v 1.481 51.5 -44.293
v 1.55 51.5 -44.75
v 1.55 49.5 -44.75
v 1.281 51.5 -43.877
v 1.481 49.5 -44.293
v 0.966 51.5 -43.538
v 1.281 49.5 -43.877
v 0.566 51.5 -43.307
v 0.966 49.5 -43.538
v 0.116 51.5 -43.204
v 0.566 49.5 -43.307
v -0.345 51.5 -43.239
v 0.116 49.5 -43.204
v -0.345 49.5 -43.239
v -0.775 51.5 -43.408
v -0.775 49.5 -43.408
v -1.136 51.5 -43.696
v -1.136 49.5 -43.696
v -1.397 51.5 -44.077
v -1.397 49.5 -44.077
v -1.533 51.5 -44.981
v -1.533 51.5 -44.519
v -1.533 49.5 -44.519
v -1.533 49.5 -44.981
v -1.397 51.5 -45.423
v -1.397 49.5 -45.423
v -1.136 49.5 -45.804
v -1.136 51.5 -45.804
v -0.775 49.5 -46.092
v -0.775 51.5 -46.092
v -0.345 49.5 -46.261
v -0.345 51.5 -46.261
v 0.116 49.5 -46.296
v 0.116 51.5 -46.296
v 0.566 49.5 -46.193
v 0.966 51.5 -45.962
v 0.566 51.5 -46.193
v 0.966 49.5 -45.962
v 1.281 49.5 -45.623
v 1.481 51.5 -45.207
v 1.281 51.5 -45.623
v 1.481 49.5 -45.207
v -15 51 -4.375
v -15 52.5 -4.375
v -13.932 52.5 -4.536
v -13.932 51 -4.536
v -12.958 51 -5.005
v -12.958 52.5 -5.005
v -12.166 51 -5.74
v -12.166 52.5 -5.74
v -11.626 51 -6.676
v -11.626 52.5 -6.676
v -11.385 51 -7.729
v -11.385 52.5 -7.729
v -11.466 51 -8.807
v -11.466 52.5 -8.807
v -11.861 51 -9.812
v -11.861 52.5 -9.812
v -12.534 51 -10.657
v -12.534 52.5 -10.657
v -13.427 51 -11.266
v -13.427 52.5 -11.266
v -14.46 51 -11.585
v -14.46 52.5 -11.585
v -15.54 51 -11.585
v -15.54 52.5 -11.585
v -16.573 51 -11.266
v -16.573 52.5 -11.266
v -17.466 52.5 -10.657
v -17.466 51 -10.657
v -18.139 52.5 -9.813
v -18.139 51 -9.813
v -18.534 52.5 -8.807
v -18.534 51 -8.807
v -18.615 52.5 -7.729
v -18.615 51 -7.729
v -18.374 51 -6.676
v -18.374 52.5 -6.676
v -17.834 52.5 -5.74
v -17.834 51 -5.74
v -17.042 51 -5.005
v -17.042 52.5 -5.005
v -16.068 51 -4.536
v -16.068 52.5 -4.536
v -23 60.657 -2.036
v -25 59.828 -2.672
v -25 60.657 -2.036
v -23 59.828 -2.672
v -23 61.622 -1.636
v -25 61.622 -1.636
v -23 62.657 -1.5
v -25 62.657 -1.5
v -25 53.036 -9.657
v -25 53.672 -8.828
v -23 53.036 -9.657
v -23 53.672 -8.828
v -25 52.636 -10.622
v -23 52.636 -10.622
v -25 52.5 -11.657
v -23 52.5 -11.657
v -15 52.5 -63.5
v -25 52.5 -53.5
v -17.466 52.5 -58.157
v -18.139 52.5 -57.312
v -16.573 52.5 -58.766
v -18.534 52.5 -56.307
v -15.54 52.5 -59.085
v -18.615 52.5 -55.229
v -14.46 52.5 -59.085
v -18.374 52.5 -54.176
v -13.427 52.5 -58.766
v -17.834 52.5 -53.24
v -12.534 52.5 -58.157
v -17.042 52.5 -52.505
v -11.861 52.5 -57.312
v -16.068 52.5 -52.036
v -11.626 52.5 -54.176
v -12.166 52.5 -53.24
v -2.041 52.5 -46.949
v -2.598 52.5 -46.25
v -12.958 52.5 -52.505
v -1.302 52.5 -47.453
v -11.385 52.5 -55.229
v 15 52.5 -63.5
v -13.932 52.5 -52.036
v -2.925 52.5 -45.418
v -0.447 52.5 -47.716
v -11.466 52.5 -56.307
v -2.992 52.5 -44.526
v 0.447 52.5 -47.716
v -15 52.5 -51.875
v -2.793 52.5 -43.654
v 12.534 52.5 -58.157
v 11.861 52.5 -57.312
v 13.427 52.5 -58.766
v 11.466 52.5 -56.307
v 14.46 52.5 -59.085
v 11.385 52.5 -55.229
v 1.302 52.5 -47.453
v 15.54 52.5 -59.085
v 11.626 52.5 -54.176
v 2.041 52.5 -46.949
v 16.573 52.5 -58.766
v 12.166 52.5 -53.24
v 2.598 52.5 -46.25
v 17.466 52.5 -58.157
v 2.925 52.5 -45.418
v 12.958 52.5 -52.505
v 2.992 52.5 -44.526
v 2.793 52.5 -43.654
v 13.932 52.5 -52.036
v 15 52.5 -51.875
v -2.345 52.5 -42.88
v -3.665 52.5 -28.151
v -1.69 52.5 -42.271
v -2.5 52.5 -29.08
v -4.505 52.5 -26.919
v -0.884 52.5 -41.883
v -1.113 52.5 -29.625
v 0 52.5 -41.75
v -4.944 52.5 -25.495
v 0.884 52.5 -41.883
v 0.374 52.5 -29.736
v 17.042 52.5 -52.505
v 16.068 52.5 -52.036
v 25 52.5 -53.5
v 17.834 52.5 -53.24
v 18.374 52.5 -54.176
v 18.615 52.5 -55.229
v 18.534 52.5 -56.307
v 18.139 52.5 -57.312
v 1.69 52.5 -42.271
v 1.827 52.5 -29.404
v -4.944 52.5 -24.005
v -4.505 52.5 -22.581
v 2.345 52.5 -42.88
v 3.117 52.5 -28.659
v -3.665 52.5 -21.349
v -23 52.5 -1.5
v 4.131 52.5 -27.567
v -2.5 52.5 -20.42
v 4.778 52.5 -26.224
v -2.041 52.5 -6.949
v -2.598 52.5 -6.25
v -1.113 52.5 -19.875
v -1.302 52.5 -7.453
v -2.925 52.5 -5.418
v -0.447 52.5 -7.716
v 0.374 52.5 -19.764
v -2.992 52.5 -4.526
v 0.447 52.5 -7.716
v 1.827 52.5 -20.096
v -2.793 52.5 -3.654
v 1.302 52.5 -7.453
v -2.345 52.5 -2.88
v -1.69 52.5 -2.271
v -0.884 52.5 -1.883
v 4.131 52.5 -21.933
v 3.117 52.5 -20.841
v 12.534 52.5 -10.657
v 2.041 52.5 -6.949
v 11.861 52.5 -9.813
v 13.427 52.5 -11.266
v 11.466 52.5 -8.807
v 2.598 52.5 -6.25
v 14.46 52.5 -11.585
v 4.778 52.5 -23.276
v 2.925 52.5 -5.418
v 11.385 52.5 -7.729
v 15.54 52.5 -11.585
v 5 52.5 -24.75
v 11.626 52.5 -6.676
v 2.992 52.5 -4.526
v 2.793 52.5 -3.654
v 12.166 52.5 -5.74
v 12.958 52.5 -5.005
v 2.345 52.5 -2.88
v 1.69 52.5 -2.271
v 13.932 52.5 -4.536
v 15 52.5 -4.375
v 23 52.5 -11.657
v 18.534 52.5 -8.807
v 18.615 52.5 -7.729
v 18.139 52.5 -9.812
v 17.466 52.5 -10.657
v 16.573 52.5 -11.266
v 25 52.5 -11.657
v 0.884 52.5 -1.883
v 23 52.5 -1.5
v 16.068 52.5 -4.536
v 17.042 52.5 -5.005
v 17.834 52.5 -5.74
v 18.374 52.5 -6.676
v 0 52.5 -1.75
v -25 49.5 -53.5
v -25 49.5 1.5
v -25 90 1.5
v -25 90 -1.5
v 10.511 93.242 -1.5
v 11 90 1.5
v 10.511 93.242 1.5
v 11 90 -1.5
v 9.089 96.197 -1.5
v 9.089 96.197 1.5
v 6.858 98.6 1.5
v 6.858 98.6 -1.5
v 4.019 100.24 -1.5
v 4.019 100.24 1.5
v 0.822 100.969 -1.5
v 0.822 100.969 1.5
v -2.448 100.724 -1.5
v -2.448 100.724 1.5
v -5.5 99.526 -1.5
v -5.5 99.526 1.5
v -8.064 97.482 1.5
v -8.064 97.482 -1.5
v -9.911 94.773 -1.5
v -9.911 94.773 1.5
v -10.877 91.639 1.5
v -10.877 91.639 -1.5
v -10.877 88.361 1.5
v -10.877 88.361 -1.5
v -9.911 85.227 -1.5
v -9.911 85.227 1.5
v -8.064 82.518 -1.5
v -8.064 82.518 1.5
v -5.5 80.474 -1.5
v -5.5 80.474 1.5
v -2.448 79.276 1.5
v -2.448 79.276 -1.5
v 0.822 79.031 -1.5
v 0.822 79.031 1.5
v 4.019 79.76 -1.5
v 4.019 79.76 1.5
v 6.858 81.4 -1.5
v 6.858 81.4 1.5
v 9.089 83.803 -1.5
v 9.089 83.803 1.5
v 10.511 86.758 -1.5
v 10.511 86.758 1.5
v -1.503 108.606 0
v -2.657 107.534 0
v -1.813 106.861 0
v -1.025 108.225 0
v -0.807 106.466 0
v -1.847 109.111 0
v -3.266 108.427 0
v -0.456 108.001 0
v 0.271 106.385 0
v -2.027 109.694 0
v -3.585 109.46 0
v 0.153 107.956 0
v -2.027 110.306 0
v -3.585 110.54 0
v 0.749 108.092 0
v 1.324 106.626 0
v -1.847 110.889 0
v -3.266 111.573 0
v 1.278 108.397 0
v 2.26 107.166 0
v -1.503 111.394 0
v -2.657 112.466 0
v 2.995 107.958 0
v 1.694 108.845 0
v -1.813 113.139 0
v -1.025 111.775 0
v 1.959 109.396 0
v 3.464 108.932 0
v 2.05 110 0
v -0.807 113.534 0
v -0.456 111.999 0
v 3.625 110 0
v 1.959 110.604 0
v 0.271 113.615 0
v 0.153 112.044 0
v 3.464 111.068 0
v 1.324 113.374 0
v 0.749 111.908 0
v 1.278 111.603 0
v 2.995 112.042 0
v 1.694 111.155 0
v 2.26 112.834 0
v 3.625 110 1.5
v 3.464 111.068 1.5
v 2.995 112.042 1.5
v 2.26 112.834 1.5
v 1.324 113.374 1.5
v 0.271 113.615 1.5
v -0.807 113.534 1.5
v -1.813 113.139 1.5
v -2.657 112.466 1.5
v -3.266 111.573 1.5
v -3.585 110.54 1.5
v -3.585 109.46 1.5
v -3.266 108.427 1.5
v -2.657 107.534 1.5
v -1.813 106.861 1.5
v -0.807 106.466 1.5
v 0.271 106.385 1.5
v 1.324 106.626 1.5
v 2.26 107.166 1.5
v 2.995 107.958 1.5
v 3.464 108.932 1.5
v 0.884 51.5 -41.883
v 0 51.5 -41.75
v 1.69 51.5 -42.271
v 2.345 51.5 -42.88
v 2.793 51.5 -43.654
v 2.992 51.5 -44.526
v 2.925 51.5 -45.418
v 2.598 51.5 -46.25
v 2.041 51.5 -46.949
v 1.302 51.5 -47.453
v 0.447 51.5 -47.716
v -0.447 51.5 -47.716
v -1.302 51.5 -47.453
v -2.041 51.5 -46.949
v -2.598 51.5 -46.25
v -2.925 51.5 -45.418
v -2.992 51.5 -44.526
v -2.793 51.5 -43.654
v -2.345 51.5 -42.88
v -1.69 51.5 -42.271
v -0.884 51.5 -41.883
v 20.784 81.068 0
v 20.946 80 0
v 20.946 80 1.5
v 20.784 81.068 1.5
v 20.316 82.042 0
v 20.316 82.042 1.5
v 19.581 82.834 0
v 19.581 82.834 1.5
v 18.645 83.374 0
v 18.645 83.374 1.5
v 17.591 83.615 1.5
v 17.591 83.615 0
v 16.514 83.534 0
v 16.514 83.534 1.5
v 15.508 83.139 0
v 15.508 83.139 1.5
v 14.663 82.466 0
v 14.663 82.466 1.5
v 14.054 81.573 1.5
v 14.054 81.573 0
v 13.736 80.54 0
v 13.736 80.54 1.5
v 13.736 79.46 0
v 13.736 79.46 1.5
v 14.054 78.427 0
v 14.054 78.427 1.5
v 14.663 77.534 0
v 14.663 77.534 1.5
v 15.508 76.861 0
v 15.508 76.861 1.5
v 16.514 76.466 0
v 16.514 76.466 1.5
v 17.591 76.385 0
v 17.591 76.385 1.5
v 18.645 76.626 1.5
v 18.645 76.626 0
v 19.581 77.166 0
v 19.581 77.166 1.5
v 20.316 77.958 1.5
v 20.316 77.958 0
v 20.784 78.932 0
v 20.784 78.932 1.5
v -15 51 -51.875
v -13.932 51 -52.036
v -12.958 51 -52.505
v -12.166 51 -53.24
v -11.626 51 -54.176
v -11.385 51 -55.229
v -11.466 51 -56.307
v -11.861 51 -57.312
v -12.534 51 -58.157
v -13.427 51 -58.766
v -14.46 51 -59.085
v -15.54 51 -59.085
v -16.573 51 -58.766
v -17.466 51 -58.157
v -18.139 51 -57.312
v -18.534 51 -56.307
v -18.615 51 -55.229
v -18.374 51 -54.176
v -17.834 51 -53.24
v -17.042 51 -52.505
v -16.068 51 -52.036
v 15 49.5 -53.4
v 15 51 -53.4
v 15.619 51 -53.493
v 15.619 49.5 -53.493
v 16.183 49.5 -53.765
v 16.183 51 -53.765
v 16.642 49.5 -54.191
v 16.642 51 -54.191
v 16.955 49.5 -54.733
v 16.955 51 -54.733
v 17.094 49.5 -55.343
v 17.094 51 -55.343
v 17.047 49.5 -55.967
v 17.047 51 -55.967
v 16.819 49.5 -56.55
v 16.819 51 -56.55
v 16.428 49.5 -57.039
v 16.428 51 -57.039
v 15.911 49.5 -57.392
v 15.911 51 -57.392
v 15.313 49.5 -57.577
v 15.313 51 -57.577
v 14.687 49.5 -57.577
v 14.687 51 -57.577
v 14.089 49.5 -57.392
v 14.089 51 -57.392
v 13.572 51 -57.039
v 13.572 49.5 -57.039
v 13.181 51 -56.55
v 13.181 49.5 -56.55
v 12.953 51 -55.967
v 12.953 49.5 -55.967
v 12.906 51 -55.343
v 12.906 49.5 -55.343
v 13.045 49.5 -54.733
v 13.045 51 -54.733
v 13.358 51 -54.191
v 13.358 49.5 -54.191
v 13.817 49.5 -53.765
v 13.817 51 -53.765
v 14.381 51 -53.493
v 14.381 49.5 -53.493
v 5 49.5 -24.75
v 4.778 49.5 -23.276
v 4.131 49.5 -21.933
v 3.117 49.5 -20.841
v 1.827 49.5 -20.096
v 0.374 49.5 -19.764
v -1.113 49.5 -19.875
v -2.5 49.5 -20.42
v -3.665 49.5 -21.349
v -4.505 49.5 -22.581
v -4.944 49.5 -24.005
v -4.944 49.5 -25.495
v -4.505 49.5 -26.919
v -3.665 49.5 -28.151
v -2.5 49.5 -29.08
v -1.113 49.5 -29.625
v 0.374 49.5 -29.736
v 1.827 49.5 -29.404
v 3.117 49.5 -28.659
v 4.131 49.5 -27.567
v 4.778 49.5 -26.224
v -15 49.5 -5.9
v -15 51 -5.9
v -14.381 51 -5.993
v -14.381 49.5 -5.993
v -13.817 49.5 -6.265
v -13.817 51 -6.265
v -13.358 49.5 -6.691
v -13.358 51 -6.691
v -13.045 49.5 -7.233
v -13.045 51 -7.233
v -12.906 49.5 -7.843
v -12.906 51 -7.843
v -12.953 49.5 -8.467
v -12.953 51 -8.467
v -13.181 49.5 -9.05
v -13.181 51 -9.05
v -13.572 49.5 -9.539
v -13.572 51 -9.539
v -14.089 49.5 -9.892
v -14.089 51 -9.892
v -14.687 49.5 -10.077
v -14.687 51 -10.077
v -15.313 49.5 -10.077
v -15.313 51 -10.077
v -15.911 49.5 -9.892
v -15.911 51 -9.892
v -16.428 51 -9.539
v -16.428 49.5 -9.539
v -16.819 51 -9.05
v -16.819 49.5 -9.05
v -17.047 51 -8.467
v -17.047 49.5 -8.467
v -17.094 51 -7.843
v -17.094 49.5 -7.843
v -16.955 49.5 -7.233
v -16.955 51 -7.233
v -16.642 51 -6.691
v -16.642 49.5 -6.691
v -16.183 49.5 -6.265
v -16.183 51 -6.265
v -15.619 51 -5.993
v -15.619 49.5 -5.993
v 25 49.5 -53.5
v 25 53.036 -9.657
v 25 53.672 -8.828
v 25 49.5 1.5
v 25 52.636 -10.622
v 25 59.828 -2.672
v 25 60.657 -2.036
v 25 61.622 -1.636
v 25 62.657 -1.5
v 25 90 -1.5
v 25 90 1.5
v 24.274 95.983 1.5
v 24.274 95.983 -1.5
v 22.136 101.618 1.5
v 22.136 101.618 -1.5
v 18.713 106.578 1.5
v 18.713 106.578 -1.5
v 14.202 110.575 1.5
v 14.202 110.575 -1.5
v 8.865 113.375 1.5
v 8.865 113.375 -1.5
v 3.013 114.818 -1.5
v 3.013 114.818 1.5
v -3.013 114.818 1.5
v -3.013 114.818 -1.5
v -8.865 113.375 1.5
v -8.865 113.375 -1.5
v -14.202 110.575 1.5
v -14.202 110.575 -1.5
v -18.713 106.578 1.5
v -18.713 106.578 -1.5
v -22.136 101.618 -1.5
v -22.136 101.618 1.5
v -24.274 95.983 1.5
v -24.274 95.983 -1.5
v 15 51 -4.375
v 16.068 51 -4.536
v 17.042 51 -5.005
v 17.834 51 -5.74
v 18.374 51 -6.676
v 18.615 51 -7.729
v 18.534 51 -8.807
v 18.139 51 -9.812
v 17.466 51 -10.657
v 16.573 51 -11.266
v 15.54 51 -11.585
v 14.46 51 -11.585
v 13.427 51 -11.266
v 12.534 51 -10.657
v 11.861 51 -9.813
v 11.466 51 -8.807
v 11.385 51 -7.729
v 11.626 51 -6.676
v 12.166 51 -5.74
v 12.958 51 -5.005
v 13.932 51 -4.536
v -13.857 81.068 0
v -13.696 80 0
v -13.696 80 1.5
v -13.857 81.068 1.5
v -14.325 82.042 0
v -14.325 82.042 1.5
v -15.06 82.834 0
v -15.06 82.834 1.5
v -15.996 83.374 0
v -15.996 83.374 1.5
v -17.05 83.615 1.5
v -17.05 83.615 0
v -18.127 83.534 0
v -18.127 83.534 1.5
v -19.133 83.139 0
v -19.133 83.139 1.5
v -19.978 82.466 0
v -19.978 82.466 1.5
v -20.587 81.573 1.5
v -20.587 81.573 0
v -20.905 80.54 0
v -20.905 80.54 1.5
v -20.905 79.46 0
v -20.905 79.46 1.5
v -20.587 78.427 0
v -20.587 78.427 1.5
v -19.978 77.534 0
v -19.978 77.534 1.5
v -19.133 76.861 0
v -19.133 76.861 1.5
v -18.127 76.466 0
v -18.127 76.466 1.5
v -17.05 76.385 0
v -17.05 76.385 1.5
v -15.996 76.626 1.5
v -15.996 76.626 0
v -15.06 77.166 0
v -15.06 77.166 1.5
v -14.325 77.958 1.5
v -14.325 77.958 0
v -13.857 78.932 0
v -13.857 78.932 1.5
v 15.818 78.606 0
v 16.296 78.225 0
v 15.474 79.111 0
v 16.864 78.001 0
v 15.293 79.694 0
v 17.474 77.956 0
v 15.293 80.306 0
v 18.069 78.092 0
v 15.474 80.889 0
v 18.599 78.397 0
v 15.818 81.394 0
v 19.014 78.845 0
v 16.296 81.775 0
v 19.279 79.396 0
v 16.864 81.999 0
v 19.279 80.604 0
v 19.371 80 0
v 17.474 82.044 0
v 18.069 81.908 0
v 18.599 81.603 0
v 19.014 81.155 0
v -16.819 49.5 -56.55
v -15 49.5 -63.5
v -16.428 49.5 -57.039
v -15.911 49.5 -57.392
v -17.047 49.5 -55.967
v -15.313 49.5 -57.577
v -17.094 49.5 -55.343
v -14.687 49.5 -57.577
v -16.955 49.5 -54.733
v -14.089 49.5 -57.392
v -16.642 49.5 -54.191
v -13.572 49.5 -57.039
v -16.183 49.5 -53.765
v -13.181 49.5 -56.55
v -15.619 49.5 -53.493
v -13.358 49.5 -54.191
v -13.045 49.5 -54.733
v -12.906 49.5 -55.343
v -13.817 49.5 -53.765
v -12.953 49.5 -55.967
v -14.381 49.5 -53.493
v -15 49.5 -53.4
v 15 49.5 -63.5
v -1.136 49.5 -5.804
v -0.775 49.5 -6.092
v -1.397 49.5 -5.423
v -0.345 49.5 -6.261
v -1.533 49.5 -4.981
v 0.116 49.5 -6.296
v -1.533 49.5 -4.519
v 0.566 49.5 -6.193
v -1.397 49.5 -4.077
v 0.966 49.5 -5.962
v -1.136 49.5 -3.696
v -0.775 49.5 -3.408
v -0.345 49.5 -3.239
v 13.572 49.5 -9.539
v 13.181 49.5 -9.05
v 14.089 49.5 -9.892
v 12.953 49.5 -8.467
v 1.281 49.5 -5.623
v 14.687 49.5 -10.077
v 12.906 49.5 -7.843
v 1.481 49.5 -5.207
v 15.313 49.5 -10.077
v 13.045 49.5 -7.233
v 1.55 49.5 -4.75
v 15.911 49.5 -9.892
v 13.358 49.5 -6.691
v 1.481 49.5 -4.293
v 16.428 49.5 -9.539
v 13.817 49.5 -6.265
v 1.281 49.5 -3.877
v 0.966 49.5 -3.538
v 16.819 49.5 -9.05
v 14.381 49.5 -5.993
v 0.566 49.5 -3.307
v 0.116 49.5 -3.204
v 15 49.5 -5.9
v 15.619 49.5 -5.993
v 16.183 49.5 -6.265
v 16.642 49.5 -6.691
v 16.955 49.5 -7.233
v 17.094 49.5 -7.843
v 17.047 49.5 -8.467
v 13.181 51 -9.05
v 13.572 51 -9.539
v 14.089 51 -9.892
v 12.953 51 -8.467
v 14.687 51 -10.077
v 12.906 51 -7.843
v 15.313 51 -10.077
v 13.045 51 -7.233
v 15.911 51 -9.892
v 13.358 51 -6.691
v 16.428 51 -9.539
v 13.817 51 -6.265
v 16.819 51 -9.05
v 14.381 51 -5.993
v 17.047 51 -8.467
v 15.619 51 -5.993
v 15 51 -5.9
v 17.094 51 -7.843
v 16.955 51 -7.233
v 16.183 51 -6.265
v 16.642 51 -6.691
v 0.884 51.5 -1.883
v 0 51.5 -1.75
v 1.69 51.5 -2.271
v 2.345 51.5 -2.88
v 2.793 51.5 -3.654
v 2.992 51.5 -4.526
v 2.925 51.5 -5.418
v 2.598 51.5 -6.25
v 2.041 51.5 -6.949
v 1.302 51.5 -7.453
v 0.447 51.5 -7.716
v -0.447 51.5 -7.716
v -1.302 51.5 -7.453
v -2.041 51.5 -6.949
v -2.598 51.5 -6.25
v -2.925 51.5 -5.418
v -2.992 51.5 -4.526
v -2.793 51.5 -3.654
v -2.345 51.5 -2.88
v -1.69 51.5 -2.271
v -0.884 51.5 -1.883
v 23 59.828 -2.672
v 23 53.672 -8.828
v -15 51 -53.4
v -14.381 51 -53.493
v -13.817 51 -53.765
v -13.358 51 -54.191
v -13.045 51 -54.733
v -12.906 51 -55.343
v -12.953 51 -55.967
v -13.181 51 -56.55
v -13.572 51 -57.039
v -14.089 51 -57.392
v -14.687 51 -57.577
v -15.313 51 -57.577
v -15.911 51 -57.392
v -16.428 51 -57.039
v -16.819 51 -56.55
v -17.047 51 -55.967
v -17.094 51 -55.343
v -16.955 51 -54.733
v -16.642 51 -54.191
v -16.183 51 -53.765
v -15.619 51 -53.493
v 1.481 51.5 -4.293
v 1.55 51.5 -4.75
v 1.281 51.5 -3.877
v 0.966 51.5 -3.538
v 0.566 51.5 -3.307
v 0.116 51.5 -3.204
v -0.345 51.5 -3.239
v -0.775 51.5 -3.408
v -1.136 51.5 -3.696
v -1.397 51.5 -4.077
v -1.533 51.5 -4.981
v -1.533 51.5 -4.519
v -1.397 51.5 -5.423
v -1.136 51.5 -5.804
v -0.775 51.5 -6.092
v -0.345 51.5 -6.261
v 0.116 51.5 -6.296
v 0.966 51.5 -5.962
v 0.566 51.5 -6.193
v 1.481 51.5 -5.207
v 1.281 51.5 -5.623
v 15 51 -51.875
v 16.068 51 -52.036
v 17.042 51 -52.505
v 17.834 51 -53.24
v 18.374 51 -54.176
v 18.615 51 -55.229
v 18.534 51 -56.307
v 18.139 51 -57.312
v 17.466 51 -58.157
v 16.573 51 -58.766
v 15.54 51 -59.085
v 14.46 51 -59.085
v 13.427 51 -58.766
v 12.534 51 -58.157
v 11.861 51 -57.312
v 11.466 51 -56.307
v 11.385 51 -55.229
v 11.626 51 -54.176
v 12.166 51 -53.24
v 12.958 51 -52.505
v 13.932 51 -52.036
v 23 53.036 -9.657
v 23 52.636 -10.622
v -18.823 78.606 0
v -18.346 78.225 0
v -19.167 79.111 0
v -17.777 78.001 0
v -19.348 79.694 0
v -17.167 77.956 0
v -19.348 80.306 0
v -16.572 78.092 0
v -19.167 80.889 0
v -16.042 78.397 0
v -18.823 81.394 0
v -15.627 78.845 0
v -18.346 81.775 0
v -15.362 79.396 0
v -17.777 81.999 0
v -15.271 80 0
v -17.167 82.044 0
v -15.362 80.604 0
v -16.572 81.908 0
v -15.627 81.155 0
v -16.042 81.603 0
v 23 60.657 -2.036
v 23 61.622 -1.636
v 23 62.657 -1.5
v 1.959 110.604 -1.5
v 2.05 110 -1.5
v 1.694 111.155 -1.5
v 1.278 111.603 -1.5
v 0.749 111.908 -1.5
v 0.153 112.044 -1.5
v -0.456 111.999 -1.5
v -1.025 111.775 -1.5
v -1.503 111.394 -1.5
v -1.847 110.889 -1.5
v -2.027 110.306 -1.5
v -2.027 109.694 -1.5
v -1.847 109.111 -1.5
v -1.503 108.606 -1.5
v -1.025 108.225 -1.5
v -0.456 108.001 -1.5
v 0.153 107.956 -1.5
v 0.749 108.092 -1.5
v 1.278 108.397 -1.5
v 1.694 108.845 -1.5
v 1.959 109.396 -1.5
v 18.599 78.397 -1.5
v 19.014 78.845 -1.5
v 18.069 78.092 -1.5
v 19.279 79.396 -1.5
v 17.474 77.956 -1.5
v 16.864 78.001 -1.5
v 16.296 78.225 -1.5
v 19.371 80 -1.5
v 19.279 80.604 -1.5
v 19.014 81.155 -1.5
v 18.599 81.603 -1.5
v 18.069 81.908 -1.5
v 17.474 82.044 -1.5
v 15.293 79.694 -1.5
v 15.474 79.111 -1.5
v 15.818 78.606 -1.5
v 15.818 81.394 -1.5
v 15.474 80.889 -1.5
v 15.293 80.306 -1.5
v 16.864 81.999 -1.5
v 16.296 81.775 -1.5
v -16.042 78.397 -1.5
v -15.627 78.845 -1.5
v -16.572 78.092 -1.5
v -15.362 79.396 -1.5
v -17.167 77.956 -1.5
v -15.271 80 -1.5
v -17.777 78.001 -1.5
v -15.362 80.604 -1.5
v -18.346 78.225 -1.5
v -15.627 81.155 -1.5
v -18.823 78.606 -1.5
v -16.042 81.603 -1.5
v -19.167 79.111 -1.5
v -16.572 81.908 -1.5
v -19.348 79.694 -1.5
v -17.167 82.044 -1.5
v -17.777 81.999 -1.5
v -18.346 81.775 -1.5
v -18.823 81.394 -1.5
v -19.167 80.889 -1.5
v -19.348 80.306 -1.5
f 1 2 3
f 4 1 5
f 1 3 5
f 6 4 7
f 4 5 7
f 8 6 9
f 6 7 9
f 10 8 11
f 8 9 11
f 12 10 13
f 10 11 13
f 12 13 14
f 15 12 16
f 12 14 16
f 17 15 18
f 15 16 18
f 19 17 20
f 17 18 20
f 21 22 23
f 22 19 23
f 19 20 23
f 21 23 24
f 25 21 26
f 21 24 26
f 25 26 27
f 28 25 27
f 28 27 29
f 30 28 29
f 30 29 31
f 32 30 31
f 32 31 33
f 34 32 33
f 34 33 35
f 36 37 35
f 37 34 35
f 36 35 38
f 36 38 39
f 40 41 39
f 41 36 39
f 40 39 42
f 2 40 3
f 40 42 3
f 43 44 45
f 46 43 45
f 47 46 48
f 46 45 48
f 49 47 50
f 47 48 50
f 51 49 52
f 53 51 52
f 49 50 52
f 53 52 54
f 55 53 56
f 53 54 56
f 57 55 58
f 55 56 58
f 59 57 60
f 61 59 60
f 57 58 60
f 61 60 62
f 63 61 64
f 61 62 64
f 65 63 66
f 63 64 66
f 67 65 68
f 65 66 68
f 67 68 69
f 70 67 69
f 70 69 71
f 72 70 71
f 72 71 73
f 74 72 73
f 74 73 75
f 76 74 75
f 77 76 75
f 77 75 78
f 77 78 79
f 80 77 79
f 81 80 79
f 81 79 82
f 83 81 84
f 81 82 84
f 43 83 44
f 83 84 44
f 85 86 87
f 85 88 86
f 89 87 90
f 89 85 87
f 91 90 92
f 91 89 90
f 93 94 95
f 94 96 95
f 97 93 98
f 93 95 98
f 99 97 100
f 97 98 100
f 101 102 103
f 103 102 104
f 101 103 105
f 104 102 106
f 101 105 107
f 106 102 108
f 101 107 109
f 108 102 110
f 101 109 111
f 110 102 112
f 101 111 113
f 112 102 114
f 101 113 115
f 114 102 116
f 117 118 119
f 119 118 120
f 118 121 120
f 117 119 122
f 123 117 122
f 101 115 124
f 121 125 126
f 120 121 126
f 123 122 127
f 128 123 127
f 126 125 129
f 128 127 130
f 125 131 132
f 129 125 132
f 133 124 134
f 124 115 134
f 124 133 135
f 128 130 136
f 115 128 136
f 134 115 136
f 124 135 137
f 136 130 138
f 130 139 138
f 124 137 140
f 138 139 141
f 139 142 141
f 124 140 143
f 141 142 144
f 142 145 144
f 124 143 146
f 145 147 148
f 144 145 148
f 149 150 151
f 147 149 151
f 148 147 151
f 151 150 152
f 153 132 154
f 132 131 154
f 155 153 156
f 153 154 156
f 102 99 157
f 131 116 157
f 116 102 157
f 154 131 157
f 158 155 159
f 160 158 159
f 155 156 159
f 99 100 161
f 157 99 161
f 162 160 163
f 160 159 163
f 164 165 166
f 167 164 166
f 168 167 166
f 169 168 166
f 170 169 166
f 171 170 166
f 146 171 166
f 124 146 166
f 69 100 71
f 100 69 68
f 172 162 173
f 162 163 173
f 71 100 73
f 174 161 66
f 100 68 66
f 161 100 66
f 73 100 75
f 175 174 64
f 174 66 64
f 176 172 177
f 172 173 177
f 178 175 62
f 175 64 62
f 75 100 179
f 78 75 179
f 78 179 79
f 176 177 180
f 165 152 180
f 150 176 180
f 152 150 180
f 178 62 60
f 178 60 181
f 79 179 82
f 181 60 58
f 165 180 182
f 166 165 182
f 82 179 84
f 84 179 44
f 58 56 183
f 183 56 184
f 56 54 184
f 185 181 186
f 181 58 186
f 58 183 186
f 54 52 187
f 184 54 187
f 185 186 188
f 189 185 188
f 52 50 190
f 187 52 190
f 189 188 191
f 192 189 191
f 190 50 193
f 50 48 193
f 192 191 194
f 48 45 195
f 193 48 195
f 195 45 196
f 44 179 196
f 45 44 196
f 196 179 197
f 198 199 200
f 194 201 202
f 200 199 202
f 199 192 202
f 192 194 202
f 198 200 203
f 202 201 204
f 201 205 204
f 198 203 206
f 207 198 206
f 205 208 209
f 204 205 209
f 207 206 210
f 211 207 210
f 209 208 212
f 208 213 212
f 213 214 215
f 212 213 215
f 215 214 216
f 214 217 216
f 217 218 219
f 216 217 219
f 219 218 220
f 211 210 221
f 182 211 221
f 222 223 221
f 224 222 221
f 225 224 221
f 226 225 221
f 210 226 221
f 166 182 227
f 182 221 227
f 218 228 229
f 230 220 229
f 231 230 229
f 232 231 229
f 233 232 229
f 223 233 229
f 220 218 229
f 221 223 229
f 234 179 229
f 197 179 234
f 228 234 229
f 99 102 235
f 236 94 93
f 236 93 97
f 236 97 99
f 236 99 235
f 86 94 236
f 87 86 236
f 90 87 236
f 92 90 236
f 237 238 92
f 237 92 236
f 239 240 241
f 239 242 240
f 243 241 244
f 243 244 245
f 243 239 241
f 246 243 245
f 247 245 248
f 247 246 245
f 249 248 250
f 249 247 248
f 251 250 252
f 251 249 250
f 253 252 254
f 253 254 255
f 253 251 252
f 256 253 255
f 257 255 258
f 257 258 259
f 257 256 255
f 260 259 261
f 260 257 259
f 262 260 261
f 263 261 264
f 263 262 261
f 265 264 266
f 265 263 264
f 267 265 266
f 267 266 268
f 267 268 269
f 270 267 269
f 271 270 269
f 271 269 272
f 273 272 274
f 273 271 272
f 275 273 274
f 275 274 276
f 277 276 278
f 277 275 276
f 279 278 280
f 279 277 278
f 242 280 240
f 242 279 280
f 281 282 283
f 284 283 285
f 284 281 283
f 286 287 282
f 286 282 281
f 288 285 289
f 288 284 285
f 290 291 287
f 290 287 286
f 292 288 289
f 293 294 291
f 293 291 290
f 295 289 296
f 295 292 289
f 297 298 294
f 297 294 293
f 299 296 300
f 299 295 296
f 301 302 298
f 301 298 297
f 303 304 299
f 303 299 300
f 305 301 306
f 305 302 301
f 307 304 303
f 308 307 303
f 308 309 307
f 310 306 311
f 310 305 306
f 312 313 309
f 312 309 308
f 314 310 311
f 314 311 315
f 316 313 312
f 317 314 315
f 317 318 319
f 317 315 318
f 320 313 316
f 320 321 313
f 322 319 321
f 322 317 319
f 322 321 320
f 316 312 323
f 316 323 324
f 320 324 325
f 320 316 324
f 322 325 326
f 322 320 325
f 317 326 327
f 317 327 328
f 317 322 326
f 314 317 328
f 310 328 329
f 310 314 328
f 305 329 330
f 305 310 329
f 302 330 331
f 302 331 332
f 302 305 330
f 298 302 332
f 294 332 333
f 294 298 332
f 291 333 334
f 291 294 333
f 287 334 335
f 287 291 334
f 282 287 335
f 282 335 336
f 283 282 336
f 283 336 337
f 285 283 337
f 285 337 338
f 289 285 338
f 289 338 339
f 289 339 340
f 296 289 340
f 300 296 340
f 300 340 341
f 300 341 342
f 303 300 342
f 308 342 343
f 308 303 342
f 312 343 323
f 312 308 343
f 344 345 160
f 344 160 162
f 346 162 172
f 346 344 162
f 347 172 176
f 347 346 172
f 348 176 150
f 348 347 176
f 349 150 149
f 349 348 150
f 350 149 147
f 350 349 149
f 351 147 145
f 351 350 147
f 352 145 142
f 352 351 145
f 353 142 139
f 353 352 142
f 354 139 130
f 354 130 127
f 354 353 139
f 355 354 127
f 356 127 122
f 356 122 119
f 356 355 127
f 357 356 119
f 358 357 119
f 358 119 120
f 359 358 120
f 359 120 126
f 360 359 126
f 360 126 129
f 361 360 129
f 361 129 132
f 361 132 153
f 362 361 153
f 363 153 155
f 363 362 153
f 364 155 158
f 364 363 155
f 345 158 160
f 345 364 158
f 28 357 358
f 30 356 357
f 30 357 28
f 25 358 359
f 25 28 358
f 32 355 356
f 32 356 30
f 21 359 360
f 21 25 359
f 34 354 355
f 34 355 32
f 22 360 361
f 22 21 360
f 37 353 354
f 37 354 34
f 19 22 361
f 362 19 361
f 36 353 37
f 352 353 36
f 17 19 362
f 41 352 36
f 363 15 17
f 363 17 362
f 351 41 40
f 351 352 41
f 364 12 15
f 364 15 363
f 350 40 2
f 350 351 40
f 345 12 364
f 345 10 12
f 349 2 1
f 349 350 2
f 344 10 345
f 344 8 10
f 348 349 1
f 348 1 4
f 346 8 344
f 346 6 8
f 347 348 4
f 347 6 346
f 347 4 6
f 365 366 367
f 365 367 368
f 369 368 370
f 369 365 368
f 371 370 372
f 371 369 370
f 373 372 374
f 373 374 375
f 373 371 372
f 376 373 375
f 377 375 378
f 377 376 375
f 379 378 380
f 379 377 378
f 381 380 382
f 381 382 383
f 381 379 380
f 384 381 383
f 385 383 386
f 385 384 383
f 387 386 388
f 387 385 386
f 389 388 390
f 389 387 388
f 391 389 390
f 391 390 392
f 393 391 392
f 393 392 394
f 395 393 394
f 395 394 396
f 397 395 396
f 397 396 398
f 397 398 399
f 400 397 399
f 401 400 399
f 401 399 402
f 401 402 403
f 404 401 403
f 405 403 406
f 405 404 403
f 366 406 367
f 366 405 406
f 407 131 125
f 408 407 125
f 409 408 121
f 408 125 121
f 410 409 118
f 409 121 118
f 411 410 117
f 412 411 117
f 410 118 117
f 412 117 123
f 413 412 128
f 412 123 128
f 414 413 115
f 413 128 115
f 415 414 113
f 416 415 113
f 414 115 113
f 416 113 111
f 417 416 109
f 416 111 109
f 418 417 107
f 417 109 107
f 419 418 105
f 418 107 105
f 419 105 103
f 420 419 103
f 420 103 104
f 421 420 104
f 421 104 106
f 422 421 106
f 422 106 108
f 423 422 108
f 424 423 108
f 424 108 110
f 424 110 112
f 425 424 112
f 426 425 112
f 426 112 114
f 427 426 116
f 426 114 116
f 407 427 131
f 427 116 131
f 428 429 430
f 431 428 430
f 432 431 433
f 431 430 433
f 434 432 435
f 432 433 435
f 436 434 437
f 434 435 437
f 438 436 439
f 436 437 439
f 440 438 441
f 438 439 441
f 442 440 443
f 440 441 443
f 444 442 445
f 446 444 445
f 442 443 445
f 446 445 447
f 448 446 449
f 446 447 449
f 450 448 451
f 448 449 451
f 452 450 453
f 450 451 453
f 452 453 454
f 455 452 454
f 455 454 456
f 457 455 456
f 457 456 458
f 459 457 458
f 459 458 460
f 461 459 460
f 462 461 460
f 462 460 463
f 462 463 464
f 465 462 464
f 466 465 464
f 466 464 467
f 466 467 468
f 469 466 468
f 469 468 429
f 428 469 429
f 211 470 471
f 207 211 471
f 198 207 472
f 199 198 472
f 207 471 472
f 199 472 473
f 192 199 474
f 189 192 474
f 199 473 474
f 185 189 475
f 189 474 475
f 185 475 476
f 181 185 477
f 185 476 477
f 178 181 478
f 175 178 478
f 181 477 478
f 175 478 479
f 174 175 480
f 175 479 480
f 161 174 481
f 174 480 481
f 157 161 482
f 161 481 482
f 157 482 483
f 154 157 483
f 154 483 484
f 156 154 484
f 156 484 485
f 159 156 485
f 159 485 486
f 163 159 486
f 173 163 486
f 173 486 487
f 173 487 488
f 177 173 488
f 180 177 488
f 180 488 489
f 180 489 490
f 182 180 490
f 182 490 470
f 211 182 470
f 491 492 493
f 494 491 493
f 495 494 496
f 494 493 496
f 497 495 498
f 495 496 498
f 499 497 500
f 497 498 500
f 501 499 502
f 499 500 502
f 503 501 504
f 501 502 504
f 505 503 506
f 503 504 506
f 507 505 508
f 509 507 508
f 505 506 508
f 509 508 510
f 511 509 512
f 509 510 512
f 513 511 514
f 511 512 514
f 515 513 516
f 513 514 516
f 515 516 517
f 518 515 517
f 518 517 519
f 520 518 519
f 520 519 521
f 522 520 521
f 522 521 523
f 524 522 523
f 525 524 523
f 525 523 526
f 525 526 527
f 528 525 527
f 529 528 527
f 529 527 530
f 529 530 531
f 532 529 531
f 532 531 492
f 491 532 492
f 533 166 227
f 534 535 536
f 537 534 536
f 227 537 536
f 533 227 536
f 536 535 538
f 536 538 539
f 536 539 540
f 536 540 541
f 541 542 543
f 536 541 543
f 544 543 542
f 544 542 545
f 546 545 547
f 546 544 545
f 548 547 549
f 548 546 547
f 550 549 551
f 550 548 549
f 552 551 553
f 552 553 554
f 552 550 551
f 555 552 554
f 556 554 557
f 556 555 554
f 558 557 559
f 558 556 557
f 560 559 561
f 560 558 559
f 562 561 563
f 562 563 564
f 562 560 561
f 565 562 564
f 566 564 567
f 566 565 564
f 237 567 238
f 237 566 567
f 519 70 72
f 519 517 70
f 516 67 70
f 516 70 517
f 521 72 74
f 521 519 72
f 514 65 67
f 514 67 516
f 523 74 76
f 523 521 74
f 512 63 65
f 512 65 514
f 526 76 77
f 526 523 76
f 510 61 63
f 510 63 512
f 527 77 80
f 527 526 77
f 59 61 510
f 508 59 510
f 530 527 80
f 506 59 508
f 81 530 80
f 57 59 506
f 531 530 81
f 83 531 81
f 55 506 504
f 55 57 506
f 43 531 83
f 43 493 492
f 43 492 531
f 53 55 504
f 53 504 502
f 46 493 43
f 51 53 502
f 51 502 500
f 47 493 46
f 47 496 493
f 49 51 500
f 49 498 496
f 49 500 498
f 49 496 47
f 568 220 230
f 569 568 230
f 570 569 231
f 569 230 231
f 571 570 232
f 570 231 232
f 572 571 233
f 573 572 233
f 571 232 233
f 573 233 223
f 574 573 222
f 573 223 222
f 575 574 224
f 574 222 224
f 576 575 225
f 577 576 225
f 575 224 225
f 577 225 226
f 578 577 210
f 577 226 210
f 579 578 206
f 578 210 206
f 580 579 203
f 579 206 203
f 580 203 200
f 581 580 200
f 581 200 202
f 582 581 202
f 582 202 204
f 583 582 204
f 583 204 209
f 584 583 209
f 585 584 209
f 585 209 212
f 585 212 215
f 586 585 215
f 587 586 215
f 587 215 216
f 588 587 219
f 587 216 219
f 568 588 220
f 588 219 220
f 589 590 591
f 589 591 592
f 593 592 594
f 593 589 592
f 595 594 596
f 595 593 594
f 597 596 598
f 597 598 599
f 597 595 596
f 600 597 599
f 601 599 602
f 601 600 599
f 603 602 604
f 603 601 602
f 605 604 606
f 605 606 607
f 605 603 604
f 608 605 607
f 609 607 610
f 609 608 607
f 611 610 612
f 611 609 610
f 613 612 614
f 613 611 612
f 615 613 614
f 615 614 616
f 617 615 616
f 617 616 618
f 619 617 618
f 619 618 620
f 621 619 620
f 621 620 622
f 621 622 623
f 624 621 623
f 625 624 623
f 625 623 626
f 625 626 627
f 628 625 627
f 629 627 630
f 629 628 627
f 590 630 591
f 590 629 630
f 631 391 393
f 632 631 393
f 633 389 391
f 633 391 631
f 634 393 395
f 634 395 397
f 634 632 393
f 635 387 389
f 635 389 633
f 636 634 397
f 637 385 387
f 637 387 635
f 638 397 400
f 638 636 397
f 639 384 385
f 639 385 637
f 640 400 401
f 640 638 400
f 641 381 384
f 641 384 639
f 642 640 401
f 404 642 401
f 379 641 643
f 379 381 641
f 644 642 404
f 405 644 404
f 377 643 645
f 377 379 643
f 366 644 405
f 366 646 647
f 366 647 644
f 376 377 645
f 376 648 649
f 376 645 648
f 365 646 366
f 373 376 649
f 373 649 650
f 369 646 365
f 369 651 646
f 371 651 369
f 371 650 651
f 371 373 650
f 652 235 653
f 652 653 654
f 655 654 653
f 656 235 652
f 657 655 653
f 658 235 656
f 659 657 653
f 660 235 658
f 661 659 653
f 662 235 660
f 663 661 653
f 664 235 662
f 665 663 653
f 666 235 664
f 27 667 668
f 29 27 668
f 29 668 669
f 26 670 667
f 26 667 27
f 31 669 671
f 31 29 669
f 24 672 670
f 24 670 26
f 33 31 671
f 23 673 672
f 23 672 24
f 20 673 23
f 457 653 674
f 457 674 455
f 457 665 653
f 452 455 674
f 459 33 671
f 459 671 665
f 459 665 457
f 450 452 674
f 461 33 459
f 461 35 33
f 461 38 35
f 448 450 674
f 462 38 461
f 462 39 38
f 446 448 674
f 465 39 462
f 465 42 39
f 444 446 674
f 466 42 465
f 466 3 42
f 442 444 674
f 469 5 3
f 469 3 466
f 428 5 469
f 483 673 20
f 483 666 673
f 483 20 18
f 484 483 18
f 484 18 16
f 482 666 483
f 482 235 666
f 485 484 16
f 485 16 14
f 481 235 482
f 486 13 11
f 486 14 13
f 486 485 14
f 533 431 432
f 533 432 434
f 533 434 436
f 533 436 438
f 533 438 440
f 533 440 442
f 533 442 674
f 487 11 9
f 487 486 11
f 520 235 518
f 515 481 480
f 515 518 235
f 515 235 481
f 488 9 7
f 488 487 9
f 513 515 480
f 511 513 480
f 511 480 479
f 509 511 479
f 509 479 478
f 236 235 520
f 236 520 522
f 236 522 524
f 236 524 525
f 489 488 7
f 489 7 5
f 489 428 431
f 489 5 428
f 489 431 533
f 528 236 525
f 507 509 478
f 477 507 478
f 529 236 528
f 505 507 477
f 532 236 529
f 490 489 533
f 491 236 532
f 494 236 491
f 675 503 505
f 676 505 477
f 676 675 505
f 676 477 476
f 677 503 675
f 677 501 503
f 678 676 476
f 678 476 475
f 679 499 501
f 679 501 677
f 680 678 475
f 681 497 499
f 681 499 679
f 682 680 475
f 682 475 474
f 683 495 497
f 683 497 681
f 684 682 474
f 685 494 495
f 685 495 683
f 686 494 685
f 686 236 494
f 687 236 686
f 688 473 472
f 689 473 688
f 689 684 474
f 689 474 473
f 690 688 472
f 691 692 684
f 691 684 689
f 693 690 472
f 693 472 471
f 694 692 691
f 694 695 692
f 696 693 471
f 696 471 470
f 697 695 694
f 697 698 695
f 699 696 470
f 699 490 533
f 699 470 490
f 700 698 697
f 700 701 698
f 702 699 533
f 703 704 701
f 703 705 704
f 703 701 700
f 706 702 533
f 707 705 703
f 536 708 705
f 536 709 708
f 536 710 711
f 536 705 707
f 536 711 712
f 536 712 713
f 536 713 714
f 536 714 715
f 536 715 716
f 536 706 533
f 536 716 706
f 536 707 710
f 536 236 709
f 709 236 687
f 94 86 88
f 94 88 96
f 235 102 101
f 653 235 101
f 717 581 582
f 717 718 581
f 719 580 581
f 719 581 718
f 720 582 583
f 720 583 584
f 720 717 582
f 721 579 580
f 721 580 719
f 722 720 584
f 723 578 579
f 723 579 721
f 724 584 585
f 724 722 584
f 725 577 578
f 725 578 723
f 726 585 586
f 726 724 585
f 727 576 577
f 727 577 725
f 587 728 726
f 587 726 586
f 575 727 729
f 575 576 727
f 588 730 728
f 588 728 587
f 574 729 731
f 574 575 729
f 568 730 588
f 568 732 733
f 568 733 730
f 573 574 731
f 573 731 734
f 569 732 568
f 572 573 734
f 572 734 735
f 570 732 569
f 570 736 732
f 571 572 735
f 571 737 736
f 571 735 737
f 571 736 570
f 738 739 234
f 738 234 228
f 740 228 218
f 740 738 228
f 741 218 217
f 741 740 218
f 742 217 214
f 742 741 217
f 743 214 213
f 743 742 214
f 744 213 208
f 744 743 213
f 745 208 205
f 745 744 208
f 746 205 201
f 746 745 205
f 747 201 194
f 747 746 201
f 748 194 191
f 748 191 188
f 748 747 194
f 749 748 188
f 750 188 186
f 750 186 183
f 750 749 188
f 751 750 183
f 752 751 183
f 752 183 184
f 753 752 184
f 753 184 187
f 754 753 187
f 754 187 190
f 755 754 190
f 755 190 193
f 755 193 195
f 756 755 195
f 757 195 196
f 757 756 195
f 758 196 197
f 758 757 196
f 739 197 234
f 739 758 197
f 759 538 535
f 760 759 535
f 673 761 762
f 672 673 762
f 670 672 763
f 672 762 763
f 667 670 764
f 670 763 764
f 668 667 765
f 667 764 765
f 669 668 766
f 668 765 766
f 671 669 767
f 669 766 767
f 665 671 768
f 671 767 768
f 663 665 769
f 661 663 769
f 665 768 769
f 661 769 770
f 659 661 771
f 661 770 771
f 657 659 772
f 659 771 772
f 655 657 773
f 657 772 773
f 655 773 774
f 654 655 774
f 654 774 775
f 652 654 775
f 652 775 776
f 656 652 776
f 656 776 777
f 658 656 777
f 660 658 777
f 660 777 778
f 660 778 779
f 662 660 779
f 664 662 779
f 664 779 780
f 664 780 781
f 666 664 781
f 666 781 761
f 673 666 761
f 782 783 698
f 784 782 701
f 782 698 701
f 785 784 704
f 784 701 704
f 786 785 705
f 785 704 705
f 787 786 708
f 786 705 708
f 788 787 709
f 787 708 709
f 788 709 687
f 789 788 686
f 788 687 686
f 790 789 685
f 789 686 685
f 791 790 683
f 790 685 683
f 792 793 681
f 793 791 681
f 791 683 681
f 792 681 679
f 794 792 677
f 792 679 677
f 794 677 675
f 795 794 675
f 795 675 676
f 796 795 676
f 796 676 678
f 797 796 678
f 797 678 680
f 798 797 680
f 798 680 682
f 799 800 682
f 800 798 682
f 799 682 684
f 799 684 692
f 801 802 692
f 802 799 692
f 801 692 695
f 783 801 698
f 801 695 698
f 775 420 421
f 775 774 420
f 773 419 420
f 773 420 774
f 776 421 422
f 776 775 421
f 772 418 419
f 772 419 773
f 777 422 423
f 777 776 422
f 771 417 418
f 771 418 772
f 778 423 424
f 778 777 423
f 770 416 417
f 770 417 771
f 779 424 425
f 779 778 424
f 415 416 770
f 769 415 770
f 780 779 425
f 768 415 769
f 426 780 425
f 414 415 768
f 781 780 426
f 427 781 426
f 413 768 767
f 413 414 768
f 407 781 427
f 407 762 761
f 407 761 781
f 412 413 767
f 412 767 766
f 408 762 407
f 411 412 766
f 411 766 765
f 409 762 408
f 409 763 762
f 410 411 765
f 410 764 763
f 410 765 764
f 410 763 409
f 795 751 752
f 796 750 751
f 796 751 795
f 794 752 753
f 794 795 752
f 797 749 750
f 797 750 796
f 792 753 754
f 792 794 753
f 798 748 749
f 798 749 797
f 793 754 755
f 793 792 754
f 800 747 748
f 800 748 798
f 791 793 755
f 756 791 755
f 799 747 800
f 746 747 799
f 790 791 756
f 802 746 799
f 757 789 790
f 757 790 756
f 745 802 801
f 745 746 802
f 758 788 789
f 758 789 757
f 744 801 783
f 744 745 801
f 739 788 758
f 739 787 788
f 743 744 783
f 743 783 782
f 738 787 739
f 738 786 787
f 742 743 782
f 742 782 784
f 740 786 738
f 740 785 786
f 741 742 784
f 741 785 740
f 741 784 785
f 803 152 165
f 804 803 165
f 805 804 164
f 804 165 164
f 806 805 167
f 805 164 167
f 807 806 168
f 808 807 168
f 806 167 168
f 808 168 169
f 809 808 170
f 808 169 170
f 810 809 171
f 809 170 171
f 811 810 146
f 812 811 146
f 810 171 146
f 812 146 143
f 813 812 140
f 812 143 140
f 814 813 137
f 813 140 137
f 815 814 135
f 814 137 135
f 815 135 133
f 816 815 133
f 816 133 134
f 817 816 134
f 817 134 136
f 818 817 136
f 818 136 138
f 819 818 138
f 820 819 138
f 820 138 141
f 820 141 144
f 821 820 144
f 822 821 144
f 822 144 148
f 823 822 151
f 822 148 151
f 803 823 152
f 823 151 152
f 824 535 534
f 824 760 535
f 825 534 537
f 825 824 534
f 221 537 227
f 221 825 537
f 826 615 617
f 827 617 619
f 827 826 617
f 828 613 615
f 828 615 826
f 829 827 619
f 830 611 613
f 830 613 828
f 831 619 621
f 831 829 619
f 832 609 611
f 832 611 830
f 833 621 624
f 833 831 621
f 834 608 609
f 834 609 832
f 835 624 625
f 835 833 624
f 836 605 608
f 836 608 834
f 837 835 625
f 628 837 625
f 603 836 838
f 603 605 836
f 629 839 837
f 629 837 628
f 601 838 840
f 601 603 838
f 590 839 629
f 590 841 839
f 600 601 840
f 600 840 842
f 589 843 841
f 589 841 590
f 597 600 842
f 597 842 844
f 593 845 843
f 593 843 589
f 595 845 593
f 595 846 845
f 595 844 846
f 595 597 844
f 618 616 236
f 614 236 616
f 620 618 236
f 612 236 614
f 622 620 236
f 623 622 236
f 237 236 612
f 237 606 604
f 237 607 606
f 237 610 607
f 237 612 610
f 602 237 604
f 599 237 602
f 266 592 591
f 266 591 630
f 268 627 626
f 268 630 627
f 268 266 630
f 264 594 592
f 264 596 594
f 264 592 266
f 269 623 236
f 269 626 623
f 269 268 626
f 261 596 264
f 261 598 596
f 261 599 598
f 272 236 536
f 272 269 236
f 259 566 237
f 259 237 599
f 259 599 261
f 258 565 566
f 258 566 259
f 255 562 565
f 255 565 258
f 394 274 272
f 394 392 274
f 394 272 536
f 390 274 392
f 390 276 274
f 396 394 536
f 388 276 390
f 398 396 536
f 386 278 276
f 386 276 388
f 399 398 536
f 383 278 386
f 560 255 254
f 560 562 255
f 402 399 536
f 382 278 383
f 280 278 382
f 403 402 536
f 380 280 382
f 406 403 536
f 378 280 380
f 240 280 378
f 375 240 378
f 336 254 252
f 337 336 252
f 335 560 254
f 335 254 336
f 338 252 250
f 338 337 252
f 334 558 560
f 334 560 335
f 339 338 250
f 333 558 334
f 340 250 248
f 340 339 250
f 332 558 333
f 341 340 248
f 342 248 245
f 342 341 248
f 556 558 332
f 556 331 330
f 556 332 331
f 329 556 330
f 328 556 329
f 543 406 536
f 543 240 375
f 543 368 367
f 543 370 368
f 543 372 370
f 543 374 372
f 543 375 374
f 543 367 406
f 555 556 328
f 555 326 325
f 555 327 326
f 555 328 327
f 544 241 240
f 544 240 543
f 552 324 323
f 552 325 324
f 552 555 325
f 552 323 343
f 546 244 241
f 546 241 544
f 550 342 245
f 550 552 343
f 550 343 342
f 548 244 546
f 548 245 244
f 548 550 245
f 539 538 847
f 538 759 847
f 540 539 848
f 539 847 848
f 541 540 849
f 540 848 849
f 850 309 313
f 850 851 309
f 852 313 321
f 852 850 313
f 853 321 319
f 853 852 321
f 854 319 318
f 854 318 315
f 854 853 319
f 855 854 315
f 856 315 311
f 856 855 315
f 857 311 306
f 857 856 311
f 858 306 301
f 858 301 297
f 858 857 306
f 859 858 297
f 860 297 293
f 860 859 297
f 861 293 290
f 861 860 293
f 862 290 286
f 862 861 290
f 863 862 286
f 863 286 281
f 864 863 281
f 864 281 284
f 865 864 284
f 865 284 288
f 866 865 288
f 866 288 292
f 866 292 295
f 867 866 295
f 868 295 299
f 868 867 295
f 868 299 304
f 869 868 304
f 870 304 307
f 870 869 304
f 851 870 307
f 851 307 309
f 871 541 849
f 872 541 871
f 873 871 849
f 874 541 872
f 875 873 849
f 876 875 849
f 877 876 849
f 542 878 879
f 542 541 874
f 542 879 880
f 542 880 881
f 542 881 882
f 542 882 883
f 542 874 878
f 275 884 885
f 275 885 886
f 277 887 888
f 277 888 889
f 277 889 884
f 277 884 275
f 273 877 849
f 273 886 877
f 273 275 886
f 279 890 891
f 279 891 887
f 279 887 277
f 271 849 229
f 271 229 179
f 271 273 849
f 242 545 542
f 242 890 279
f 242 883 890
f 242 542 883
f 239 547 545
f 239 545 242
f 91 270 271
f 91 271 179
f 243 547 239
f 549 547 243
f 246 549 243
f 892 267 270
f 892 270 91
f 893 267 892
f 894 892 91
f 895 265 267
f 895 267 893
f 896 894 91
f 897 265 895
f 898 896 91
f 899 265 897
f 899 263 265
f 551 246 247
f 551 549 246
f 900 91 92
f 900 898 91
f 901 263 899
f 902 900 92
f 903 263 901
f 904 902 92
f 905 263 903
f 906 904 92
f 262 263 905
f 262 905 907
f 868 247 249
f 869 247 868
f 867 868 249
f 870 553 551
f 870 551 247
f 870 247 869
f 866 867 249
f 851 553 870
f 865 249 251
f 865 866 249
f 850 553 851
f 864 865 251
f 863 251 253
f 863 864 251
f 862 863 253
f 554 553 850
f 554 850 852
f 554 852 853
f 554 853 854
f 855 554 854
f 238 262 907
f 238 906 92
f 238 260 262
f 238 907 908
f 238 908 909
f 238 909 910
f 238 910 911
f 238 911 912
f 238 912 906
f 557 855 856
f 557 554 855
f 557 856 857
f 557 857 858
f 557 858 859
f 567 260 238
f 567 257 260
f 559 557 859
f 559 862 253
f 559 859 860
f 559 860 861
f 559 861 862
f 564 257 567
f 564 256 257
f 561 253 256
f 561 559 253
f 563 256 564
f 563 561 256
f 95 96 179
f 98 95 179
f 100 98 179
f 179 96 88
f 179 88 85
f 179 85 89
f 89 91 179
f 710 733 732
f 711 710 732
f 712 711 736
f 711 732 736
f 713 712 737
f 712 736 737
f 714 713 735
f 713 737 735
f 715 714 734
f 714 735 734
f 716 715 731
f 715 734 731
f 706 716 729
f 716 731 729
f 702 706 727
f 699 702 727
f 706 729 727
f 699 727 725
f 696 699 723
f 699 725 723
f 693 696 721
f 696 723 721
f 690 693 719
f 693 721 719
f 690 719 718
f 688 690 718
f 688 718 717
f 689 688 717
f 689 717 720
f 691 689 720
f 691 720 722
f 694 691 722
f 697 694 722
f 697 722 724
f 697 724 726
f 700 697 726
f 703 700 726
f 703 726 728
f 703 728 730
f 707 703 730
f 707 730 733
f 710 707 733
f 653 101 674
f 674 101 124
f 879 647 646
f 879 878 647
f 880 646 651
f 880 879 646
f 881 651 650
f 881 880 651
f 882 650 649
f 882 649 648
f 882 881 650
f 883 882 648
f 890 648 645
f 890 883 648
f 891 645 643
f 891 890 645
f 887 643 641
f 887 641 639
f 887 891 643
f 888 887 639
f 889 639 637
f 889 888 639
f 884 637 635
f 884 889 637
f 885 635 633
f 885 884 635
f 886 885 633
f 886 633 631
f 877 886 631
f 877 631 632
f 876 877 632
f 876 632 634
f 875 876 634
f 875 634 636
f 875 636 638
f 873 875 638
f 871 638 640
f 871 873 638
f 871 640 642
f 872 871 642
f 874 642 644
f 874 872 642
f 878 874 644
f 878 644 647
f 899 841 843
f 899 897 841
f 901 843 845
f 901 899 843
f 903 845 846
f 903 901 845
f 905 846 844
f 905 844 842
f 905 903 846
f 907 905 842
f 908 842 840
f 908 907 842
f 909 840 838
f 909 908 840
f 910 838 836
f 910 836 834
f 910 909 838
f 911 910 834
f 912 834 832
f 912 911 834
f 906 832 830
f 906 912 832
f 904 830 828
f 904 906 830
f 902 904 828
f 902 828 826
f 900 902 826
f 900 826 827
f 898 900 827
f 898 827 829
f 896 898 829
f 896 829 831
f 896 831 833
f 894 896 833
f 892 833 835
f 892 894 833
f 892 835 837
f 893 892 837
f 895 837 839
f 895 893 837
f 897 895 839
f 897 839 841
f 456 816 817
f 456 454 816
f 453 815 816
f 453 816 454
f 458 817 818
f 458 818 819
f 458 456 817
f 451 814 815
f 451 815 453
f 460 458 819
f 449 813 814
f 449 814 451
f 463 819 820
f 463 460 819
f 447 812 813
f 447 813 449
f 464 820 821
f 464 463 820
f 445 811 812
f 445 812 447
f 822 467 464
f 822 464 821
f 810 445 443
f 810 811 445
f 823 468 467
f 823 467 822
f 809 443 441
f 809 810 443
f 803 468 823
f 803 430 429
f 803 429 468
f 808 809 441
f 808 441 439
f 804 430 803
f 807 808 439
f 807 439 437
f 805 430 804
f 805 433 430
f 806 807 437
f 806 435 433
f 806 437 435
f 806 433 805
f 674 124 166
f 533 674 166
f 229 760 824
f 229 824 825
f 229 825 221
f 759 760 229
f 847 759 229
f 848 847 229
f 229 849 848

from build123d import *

# Parameters (mm, degrees)
SKETCH_1_R             = 25
SKETCH_1_R_2           = 11
SKETCH_1_R_3           = 2.05
EXTRUDE_1_DEPTH        = 1.5
EXTRUDE_START          = -3
EXTRUDE_2_DEPTH        = 3
SKETCH_4_W             = 50
SKETCH_4_H             = 3
EXTRUDE_3_DEPTH        = 65
CUT_EXTRUDE_1_DEPTH    = 55
SKETCH_7_R             = 2.1
CUT_EXTRUDE_2_DEPTH    = 55
SKETCH_9_R             = 3.625
CUT_EXTRUDE_3_DEPTH    = 1.5
CUT_EXTRUDE_START      = -1.5
SKETCH_11_R            = 3.625
SKETCH_11_R_2          = 2.05
CUT_EXTRUDE_4_DEPTH    = 1.5
SKETCH_12_R            = 1.55
SKETCH_12_R_2          = 5
CUT_EXTRUDE_5_DEPTH    = 6.5
CUT_EXTRUDE_START_2    = -1
SKETCH_13_R            = 3
SKETCH_13_R_2          = 1.55
CUT_EXTRUDE_13_DEPTH   = 1
EXTRUDE_4_DEPTH        = 2
FILLET_1_R             = 4
FILLET_1_OF_MIRROR_1_R = 4


with BuildPart() as part:
    # 草图1 → 凸台-拉伸1 (new, symmetric)
    with BuildSketch(Plane.XY):
        with Locations((0, 90)):
            Circle(SKETCH_1_R)
        with Locations((0, 90)):
            Circle(SKETCH_1_R_2, mode=Mode.SUBTRACT)
        with Locations((0, 110)):
            Circle(SKETCH_1_R_3, mode=Mode.SUBTRACT)
        with Locations((17.320508076, 80)):
            Circle(SKETCH_1_R_3, mode=Mode.SUBTRACT)
        with Locations((-17.320508076, 80)):
            Circle(SKETCH_1_R_3, mode=Mode.SUBTRACT)
    extrude(amount=EXTRUDE_1_DEPTH, both=True)

    # 草图3 → 凸台-拉伸2 (add)
    with BuildSketch(Plane(origin=(0, 0, -1.5), x_dir=(-1, 0, 0), z_dir=(0, 0, -1)).offset(EXTRUDE_START)):
        with BuildLine():
            ThreePointArc((25, 90), (0, 65), (-25, 90))
            Line((-25, 90), (-25, 52.5))
            Line((-25, 52.5), (25, 52.5))
            Line((25, 52.5), (25, 90))
        make_face()
    extrude(amount=EXTRUDE_2_DEPTH)

    # 草图4 → 凸台-拉伸3 (add)
    with BuildSketch(Plane.XY.offset(1.5)):
        with Locations((0, 51)):
            Rectangle(SKETCH_4_W, SKETCH_4_H)
    extrude(amount=-EXTRUDE_3_DEPTH)

    # 草图6 → 切除-拉伸1 (cut)
    with BuildSketch(Plane(origin=(0, 52.5, 0), x_dir=(1, 0, 0), z_dir=(0, 1, 0))):
        Polygon((-25, 53.5), (-15, 63.5), (-25, 63.5), align=None)
        Polygon((25, 63.5), (15, 63.5), (25, 53.5), align=None)
    extrude(amount=-CUT_EXTRUDE_1_DEPTH, mode=Mode.SUBTRACT)

    # 草图7 → 切除-拉伸2 (cut)
    with BuildSketch(Plane(origin=(0, 52.5, 0), x_dir=(1, 0, 0), z_dir=(0, 1, 0))):
        with Locations(Location((-15, 55.5, 0), (0, 0, 270))):
            Circle(SKETCH_7_R)
        with Locations(Location((15, 55.5, 0), (0, 0, 270))):
            Circle(SKETCH_7_R)
        with Locations(Location((15, 8, 0), (0, 0, 270))):
            Circle(SKETCH_7_R)
        with Locations(Location((-15, 8, 0), (0, 0, 270))):
            Circle(SKETCH_7_R)
    extrude(amount=-CUT_EXTRUDE_2_DEPTH, mode=Mode.SUBTRACT)

    # 草图9 → 切除-拉伸3 (cut)
    with BuildSketch(Plane(origin=(0, 52.5, 0), x_dir=(1, 0, 0), z_dir=(0, 1, 0))):
        with Locations(Location((-15, 55.5, 0), (0, 0, 270))):
            Circle(SKETCH_9_R)
        with Locations(Location((15, 55.5, 0), (0, 0, 270))):
            Circle(SKETCH_9_R)
        with Locations(Location((15, 8, 0), (0, 0, 270))):
            Circle(SKETCH_9_R)
        with Locations(Location((-15, 8, 0), (0, 0, 270))):
            Circle(SKETCH_9_R)
    extrude(amount=-CUT_EXTRUDE_3_DEPTH, mode=Mode.SUBTRACT)

    # 草图11 → 切除-拉伸4 (cut)
    # profile 1 of 3: a face of its own
    with BuildSketch(Plane.XY.offset(1.5).offset(CUT_EXTRUDE_START)):
        with Locations((0, 110)):
            Circle(SKETCH_11_R)
        with Locations((0, 110)):
            Circle(SKETCH_11_R_2, mode=Mode.SUBTRACT)
    # profile 2 of 3: a face of its own
    with BuildSketch(Plane.XY.offset(1.5).offset(CUT_EXTRUDE_START)):
        with Locations((17.320508076, 80)):
            Circle(SKETCH_11_R)
        with Locations((17.320508076, 80)):
            Circle(SKETCH_11_R_2, mode=Mode.SUBTRACT)
    # profile 3 of 3: a face of its own
    with BuildSketch(Plane.XY.offset(1.5).offset(CUT_EXTRUDE_START)):
        with Locations((-17.320508076, 80)):
            Circle(SKETCH_11_R)
        with Locations((-17.320508076, 80)):
            Circle(SKETCH_11_R_2, mode=Mode.SUBTRACT)
    extrude(amount=CUT_EXTRUDE_4_DEPTH, mode=Mode.SUBTRACT)

    # 草图12 → 切除-拉伸5 (cut)
    with BuildSketch(Plane.XZ.offset(-49.5)):
        with Locations((0, -4.75)):
            Circle(SKETCH_12_R)
        with Locations((0, -44.75)):
            Circle(SKETCH_12_R)
        with Locations((0, -24.75)):
            Circle(SKETCH_12_R_2)
    extrude(amount=-CUT_EXTRUDE_5_DEPTH, mode=Mode.SUBTRACT)

    # 草图13 → 切除-拉伸13 (cut)
    # profile 1 of 2: a face of its own
    with BuildSketch(Plane(origin=(0, 52.5, 0), x_dir=(1, 0, 0), z_dir=(0, 1, 0)).offset(CUT_EXTRUDE_START_2)):
        with Locations(Location((0, 4.75, 0), (0, 0, 270))):
            Circle(SKETCH_13_R)
        with Locations((0, 4.75)):
            Circle(SKETCH_13_R_2, mode=Mode.SUBTRACT)
    # profile 2 of 2: a face of its own
    with BuildSketch(Plane(origin=(0, 52.5, 0), x_dir=(1, 0, 0), z_dir=(0, 1, 0)).offset(CUT_EXTRUDE_START_2)):
        with Locations(Location((0, 44.75, 0), (0, 0, 270))):
            Circle(SKETCH_13_R)
        with Locations((0, 44.75)):
            Circle(SKETCH_13_R_2, mode=Mode.SUBTRACT)
    extrude(amount=CUT_EXTRUDE_13_DEPTH, mode=Mode.SUBTRACT)

    # 草图14 → 凸台-拉伸4 (add)
    with BuildSketch(Plane(origin=(25, 0, 0), x_dir=(0, 0, -1), z_dir=(1, 0, 0))):
        Polygon((1.5, 61), (10, 52.5), (1.5, 52.5), align=None)
    extrude_4 = extrude(amount=-EXTRUDE_4_DEPTH)

    # 圆角1
    fillet_1_edges = [part.edges().sort_by_distance(p)[0] for p in [
        (24, 61, -1.5),
        (24, 52.5, -10),
    ]]
    fillet(fillet_1_edges, radius=FILLET_1_R)

    # 镜向1: 凸台-拉伸4 across plane
    add(extrude_4.mirror(Plane(origin=(0, 0, 0), x_dir=(0, 0, 1), z_dir=(1, 0, 0))))

    # 圆角1 of 镜向1
    fillet_1_of_mirror_1_edges = [part.edges().sort_by_distance(p)[0] for p in [
        (-24, 61, -1.5),
        (-24, 52.5, -10),
    ]]
    fillet(fillet_1_of_mirror_1_edges, radius=FILLET_1_OF_MIRROR_1_R)


solid = part.part
